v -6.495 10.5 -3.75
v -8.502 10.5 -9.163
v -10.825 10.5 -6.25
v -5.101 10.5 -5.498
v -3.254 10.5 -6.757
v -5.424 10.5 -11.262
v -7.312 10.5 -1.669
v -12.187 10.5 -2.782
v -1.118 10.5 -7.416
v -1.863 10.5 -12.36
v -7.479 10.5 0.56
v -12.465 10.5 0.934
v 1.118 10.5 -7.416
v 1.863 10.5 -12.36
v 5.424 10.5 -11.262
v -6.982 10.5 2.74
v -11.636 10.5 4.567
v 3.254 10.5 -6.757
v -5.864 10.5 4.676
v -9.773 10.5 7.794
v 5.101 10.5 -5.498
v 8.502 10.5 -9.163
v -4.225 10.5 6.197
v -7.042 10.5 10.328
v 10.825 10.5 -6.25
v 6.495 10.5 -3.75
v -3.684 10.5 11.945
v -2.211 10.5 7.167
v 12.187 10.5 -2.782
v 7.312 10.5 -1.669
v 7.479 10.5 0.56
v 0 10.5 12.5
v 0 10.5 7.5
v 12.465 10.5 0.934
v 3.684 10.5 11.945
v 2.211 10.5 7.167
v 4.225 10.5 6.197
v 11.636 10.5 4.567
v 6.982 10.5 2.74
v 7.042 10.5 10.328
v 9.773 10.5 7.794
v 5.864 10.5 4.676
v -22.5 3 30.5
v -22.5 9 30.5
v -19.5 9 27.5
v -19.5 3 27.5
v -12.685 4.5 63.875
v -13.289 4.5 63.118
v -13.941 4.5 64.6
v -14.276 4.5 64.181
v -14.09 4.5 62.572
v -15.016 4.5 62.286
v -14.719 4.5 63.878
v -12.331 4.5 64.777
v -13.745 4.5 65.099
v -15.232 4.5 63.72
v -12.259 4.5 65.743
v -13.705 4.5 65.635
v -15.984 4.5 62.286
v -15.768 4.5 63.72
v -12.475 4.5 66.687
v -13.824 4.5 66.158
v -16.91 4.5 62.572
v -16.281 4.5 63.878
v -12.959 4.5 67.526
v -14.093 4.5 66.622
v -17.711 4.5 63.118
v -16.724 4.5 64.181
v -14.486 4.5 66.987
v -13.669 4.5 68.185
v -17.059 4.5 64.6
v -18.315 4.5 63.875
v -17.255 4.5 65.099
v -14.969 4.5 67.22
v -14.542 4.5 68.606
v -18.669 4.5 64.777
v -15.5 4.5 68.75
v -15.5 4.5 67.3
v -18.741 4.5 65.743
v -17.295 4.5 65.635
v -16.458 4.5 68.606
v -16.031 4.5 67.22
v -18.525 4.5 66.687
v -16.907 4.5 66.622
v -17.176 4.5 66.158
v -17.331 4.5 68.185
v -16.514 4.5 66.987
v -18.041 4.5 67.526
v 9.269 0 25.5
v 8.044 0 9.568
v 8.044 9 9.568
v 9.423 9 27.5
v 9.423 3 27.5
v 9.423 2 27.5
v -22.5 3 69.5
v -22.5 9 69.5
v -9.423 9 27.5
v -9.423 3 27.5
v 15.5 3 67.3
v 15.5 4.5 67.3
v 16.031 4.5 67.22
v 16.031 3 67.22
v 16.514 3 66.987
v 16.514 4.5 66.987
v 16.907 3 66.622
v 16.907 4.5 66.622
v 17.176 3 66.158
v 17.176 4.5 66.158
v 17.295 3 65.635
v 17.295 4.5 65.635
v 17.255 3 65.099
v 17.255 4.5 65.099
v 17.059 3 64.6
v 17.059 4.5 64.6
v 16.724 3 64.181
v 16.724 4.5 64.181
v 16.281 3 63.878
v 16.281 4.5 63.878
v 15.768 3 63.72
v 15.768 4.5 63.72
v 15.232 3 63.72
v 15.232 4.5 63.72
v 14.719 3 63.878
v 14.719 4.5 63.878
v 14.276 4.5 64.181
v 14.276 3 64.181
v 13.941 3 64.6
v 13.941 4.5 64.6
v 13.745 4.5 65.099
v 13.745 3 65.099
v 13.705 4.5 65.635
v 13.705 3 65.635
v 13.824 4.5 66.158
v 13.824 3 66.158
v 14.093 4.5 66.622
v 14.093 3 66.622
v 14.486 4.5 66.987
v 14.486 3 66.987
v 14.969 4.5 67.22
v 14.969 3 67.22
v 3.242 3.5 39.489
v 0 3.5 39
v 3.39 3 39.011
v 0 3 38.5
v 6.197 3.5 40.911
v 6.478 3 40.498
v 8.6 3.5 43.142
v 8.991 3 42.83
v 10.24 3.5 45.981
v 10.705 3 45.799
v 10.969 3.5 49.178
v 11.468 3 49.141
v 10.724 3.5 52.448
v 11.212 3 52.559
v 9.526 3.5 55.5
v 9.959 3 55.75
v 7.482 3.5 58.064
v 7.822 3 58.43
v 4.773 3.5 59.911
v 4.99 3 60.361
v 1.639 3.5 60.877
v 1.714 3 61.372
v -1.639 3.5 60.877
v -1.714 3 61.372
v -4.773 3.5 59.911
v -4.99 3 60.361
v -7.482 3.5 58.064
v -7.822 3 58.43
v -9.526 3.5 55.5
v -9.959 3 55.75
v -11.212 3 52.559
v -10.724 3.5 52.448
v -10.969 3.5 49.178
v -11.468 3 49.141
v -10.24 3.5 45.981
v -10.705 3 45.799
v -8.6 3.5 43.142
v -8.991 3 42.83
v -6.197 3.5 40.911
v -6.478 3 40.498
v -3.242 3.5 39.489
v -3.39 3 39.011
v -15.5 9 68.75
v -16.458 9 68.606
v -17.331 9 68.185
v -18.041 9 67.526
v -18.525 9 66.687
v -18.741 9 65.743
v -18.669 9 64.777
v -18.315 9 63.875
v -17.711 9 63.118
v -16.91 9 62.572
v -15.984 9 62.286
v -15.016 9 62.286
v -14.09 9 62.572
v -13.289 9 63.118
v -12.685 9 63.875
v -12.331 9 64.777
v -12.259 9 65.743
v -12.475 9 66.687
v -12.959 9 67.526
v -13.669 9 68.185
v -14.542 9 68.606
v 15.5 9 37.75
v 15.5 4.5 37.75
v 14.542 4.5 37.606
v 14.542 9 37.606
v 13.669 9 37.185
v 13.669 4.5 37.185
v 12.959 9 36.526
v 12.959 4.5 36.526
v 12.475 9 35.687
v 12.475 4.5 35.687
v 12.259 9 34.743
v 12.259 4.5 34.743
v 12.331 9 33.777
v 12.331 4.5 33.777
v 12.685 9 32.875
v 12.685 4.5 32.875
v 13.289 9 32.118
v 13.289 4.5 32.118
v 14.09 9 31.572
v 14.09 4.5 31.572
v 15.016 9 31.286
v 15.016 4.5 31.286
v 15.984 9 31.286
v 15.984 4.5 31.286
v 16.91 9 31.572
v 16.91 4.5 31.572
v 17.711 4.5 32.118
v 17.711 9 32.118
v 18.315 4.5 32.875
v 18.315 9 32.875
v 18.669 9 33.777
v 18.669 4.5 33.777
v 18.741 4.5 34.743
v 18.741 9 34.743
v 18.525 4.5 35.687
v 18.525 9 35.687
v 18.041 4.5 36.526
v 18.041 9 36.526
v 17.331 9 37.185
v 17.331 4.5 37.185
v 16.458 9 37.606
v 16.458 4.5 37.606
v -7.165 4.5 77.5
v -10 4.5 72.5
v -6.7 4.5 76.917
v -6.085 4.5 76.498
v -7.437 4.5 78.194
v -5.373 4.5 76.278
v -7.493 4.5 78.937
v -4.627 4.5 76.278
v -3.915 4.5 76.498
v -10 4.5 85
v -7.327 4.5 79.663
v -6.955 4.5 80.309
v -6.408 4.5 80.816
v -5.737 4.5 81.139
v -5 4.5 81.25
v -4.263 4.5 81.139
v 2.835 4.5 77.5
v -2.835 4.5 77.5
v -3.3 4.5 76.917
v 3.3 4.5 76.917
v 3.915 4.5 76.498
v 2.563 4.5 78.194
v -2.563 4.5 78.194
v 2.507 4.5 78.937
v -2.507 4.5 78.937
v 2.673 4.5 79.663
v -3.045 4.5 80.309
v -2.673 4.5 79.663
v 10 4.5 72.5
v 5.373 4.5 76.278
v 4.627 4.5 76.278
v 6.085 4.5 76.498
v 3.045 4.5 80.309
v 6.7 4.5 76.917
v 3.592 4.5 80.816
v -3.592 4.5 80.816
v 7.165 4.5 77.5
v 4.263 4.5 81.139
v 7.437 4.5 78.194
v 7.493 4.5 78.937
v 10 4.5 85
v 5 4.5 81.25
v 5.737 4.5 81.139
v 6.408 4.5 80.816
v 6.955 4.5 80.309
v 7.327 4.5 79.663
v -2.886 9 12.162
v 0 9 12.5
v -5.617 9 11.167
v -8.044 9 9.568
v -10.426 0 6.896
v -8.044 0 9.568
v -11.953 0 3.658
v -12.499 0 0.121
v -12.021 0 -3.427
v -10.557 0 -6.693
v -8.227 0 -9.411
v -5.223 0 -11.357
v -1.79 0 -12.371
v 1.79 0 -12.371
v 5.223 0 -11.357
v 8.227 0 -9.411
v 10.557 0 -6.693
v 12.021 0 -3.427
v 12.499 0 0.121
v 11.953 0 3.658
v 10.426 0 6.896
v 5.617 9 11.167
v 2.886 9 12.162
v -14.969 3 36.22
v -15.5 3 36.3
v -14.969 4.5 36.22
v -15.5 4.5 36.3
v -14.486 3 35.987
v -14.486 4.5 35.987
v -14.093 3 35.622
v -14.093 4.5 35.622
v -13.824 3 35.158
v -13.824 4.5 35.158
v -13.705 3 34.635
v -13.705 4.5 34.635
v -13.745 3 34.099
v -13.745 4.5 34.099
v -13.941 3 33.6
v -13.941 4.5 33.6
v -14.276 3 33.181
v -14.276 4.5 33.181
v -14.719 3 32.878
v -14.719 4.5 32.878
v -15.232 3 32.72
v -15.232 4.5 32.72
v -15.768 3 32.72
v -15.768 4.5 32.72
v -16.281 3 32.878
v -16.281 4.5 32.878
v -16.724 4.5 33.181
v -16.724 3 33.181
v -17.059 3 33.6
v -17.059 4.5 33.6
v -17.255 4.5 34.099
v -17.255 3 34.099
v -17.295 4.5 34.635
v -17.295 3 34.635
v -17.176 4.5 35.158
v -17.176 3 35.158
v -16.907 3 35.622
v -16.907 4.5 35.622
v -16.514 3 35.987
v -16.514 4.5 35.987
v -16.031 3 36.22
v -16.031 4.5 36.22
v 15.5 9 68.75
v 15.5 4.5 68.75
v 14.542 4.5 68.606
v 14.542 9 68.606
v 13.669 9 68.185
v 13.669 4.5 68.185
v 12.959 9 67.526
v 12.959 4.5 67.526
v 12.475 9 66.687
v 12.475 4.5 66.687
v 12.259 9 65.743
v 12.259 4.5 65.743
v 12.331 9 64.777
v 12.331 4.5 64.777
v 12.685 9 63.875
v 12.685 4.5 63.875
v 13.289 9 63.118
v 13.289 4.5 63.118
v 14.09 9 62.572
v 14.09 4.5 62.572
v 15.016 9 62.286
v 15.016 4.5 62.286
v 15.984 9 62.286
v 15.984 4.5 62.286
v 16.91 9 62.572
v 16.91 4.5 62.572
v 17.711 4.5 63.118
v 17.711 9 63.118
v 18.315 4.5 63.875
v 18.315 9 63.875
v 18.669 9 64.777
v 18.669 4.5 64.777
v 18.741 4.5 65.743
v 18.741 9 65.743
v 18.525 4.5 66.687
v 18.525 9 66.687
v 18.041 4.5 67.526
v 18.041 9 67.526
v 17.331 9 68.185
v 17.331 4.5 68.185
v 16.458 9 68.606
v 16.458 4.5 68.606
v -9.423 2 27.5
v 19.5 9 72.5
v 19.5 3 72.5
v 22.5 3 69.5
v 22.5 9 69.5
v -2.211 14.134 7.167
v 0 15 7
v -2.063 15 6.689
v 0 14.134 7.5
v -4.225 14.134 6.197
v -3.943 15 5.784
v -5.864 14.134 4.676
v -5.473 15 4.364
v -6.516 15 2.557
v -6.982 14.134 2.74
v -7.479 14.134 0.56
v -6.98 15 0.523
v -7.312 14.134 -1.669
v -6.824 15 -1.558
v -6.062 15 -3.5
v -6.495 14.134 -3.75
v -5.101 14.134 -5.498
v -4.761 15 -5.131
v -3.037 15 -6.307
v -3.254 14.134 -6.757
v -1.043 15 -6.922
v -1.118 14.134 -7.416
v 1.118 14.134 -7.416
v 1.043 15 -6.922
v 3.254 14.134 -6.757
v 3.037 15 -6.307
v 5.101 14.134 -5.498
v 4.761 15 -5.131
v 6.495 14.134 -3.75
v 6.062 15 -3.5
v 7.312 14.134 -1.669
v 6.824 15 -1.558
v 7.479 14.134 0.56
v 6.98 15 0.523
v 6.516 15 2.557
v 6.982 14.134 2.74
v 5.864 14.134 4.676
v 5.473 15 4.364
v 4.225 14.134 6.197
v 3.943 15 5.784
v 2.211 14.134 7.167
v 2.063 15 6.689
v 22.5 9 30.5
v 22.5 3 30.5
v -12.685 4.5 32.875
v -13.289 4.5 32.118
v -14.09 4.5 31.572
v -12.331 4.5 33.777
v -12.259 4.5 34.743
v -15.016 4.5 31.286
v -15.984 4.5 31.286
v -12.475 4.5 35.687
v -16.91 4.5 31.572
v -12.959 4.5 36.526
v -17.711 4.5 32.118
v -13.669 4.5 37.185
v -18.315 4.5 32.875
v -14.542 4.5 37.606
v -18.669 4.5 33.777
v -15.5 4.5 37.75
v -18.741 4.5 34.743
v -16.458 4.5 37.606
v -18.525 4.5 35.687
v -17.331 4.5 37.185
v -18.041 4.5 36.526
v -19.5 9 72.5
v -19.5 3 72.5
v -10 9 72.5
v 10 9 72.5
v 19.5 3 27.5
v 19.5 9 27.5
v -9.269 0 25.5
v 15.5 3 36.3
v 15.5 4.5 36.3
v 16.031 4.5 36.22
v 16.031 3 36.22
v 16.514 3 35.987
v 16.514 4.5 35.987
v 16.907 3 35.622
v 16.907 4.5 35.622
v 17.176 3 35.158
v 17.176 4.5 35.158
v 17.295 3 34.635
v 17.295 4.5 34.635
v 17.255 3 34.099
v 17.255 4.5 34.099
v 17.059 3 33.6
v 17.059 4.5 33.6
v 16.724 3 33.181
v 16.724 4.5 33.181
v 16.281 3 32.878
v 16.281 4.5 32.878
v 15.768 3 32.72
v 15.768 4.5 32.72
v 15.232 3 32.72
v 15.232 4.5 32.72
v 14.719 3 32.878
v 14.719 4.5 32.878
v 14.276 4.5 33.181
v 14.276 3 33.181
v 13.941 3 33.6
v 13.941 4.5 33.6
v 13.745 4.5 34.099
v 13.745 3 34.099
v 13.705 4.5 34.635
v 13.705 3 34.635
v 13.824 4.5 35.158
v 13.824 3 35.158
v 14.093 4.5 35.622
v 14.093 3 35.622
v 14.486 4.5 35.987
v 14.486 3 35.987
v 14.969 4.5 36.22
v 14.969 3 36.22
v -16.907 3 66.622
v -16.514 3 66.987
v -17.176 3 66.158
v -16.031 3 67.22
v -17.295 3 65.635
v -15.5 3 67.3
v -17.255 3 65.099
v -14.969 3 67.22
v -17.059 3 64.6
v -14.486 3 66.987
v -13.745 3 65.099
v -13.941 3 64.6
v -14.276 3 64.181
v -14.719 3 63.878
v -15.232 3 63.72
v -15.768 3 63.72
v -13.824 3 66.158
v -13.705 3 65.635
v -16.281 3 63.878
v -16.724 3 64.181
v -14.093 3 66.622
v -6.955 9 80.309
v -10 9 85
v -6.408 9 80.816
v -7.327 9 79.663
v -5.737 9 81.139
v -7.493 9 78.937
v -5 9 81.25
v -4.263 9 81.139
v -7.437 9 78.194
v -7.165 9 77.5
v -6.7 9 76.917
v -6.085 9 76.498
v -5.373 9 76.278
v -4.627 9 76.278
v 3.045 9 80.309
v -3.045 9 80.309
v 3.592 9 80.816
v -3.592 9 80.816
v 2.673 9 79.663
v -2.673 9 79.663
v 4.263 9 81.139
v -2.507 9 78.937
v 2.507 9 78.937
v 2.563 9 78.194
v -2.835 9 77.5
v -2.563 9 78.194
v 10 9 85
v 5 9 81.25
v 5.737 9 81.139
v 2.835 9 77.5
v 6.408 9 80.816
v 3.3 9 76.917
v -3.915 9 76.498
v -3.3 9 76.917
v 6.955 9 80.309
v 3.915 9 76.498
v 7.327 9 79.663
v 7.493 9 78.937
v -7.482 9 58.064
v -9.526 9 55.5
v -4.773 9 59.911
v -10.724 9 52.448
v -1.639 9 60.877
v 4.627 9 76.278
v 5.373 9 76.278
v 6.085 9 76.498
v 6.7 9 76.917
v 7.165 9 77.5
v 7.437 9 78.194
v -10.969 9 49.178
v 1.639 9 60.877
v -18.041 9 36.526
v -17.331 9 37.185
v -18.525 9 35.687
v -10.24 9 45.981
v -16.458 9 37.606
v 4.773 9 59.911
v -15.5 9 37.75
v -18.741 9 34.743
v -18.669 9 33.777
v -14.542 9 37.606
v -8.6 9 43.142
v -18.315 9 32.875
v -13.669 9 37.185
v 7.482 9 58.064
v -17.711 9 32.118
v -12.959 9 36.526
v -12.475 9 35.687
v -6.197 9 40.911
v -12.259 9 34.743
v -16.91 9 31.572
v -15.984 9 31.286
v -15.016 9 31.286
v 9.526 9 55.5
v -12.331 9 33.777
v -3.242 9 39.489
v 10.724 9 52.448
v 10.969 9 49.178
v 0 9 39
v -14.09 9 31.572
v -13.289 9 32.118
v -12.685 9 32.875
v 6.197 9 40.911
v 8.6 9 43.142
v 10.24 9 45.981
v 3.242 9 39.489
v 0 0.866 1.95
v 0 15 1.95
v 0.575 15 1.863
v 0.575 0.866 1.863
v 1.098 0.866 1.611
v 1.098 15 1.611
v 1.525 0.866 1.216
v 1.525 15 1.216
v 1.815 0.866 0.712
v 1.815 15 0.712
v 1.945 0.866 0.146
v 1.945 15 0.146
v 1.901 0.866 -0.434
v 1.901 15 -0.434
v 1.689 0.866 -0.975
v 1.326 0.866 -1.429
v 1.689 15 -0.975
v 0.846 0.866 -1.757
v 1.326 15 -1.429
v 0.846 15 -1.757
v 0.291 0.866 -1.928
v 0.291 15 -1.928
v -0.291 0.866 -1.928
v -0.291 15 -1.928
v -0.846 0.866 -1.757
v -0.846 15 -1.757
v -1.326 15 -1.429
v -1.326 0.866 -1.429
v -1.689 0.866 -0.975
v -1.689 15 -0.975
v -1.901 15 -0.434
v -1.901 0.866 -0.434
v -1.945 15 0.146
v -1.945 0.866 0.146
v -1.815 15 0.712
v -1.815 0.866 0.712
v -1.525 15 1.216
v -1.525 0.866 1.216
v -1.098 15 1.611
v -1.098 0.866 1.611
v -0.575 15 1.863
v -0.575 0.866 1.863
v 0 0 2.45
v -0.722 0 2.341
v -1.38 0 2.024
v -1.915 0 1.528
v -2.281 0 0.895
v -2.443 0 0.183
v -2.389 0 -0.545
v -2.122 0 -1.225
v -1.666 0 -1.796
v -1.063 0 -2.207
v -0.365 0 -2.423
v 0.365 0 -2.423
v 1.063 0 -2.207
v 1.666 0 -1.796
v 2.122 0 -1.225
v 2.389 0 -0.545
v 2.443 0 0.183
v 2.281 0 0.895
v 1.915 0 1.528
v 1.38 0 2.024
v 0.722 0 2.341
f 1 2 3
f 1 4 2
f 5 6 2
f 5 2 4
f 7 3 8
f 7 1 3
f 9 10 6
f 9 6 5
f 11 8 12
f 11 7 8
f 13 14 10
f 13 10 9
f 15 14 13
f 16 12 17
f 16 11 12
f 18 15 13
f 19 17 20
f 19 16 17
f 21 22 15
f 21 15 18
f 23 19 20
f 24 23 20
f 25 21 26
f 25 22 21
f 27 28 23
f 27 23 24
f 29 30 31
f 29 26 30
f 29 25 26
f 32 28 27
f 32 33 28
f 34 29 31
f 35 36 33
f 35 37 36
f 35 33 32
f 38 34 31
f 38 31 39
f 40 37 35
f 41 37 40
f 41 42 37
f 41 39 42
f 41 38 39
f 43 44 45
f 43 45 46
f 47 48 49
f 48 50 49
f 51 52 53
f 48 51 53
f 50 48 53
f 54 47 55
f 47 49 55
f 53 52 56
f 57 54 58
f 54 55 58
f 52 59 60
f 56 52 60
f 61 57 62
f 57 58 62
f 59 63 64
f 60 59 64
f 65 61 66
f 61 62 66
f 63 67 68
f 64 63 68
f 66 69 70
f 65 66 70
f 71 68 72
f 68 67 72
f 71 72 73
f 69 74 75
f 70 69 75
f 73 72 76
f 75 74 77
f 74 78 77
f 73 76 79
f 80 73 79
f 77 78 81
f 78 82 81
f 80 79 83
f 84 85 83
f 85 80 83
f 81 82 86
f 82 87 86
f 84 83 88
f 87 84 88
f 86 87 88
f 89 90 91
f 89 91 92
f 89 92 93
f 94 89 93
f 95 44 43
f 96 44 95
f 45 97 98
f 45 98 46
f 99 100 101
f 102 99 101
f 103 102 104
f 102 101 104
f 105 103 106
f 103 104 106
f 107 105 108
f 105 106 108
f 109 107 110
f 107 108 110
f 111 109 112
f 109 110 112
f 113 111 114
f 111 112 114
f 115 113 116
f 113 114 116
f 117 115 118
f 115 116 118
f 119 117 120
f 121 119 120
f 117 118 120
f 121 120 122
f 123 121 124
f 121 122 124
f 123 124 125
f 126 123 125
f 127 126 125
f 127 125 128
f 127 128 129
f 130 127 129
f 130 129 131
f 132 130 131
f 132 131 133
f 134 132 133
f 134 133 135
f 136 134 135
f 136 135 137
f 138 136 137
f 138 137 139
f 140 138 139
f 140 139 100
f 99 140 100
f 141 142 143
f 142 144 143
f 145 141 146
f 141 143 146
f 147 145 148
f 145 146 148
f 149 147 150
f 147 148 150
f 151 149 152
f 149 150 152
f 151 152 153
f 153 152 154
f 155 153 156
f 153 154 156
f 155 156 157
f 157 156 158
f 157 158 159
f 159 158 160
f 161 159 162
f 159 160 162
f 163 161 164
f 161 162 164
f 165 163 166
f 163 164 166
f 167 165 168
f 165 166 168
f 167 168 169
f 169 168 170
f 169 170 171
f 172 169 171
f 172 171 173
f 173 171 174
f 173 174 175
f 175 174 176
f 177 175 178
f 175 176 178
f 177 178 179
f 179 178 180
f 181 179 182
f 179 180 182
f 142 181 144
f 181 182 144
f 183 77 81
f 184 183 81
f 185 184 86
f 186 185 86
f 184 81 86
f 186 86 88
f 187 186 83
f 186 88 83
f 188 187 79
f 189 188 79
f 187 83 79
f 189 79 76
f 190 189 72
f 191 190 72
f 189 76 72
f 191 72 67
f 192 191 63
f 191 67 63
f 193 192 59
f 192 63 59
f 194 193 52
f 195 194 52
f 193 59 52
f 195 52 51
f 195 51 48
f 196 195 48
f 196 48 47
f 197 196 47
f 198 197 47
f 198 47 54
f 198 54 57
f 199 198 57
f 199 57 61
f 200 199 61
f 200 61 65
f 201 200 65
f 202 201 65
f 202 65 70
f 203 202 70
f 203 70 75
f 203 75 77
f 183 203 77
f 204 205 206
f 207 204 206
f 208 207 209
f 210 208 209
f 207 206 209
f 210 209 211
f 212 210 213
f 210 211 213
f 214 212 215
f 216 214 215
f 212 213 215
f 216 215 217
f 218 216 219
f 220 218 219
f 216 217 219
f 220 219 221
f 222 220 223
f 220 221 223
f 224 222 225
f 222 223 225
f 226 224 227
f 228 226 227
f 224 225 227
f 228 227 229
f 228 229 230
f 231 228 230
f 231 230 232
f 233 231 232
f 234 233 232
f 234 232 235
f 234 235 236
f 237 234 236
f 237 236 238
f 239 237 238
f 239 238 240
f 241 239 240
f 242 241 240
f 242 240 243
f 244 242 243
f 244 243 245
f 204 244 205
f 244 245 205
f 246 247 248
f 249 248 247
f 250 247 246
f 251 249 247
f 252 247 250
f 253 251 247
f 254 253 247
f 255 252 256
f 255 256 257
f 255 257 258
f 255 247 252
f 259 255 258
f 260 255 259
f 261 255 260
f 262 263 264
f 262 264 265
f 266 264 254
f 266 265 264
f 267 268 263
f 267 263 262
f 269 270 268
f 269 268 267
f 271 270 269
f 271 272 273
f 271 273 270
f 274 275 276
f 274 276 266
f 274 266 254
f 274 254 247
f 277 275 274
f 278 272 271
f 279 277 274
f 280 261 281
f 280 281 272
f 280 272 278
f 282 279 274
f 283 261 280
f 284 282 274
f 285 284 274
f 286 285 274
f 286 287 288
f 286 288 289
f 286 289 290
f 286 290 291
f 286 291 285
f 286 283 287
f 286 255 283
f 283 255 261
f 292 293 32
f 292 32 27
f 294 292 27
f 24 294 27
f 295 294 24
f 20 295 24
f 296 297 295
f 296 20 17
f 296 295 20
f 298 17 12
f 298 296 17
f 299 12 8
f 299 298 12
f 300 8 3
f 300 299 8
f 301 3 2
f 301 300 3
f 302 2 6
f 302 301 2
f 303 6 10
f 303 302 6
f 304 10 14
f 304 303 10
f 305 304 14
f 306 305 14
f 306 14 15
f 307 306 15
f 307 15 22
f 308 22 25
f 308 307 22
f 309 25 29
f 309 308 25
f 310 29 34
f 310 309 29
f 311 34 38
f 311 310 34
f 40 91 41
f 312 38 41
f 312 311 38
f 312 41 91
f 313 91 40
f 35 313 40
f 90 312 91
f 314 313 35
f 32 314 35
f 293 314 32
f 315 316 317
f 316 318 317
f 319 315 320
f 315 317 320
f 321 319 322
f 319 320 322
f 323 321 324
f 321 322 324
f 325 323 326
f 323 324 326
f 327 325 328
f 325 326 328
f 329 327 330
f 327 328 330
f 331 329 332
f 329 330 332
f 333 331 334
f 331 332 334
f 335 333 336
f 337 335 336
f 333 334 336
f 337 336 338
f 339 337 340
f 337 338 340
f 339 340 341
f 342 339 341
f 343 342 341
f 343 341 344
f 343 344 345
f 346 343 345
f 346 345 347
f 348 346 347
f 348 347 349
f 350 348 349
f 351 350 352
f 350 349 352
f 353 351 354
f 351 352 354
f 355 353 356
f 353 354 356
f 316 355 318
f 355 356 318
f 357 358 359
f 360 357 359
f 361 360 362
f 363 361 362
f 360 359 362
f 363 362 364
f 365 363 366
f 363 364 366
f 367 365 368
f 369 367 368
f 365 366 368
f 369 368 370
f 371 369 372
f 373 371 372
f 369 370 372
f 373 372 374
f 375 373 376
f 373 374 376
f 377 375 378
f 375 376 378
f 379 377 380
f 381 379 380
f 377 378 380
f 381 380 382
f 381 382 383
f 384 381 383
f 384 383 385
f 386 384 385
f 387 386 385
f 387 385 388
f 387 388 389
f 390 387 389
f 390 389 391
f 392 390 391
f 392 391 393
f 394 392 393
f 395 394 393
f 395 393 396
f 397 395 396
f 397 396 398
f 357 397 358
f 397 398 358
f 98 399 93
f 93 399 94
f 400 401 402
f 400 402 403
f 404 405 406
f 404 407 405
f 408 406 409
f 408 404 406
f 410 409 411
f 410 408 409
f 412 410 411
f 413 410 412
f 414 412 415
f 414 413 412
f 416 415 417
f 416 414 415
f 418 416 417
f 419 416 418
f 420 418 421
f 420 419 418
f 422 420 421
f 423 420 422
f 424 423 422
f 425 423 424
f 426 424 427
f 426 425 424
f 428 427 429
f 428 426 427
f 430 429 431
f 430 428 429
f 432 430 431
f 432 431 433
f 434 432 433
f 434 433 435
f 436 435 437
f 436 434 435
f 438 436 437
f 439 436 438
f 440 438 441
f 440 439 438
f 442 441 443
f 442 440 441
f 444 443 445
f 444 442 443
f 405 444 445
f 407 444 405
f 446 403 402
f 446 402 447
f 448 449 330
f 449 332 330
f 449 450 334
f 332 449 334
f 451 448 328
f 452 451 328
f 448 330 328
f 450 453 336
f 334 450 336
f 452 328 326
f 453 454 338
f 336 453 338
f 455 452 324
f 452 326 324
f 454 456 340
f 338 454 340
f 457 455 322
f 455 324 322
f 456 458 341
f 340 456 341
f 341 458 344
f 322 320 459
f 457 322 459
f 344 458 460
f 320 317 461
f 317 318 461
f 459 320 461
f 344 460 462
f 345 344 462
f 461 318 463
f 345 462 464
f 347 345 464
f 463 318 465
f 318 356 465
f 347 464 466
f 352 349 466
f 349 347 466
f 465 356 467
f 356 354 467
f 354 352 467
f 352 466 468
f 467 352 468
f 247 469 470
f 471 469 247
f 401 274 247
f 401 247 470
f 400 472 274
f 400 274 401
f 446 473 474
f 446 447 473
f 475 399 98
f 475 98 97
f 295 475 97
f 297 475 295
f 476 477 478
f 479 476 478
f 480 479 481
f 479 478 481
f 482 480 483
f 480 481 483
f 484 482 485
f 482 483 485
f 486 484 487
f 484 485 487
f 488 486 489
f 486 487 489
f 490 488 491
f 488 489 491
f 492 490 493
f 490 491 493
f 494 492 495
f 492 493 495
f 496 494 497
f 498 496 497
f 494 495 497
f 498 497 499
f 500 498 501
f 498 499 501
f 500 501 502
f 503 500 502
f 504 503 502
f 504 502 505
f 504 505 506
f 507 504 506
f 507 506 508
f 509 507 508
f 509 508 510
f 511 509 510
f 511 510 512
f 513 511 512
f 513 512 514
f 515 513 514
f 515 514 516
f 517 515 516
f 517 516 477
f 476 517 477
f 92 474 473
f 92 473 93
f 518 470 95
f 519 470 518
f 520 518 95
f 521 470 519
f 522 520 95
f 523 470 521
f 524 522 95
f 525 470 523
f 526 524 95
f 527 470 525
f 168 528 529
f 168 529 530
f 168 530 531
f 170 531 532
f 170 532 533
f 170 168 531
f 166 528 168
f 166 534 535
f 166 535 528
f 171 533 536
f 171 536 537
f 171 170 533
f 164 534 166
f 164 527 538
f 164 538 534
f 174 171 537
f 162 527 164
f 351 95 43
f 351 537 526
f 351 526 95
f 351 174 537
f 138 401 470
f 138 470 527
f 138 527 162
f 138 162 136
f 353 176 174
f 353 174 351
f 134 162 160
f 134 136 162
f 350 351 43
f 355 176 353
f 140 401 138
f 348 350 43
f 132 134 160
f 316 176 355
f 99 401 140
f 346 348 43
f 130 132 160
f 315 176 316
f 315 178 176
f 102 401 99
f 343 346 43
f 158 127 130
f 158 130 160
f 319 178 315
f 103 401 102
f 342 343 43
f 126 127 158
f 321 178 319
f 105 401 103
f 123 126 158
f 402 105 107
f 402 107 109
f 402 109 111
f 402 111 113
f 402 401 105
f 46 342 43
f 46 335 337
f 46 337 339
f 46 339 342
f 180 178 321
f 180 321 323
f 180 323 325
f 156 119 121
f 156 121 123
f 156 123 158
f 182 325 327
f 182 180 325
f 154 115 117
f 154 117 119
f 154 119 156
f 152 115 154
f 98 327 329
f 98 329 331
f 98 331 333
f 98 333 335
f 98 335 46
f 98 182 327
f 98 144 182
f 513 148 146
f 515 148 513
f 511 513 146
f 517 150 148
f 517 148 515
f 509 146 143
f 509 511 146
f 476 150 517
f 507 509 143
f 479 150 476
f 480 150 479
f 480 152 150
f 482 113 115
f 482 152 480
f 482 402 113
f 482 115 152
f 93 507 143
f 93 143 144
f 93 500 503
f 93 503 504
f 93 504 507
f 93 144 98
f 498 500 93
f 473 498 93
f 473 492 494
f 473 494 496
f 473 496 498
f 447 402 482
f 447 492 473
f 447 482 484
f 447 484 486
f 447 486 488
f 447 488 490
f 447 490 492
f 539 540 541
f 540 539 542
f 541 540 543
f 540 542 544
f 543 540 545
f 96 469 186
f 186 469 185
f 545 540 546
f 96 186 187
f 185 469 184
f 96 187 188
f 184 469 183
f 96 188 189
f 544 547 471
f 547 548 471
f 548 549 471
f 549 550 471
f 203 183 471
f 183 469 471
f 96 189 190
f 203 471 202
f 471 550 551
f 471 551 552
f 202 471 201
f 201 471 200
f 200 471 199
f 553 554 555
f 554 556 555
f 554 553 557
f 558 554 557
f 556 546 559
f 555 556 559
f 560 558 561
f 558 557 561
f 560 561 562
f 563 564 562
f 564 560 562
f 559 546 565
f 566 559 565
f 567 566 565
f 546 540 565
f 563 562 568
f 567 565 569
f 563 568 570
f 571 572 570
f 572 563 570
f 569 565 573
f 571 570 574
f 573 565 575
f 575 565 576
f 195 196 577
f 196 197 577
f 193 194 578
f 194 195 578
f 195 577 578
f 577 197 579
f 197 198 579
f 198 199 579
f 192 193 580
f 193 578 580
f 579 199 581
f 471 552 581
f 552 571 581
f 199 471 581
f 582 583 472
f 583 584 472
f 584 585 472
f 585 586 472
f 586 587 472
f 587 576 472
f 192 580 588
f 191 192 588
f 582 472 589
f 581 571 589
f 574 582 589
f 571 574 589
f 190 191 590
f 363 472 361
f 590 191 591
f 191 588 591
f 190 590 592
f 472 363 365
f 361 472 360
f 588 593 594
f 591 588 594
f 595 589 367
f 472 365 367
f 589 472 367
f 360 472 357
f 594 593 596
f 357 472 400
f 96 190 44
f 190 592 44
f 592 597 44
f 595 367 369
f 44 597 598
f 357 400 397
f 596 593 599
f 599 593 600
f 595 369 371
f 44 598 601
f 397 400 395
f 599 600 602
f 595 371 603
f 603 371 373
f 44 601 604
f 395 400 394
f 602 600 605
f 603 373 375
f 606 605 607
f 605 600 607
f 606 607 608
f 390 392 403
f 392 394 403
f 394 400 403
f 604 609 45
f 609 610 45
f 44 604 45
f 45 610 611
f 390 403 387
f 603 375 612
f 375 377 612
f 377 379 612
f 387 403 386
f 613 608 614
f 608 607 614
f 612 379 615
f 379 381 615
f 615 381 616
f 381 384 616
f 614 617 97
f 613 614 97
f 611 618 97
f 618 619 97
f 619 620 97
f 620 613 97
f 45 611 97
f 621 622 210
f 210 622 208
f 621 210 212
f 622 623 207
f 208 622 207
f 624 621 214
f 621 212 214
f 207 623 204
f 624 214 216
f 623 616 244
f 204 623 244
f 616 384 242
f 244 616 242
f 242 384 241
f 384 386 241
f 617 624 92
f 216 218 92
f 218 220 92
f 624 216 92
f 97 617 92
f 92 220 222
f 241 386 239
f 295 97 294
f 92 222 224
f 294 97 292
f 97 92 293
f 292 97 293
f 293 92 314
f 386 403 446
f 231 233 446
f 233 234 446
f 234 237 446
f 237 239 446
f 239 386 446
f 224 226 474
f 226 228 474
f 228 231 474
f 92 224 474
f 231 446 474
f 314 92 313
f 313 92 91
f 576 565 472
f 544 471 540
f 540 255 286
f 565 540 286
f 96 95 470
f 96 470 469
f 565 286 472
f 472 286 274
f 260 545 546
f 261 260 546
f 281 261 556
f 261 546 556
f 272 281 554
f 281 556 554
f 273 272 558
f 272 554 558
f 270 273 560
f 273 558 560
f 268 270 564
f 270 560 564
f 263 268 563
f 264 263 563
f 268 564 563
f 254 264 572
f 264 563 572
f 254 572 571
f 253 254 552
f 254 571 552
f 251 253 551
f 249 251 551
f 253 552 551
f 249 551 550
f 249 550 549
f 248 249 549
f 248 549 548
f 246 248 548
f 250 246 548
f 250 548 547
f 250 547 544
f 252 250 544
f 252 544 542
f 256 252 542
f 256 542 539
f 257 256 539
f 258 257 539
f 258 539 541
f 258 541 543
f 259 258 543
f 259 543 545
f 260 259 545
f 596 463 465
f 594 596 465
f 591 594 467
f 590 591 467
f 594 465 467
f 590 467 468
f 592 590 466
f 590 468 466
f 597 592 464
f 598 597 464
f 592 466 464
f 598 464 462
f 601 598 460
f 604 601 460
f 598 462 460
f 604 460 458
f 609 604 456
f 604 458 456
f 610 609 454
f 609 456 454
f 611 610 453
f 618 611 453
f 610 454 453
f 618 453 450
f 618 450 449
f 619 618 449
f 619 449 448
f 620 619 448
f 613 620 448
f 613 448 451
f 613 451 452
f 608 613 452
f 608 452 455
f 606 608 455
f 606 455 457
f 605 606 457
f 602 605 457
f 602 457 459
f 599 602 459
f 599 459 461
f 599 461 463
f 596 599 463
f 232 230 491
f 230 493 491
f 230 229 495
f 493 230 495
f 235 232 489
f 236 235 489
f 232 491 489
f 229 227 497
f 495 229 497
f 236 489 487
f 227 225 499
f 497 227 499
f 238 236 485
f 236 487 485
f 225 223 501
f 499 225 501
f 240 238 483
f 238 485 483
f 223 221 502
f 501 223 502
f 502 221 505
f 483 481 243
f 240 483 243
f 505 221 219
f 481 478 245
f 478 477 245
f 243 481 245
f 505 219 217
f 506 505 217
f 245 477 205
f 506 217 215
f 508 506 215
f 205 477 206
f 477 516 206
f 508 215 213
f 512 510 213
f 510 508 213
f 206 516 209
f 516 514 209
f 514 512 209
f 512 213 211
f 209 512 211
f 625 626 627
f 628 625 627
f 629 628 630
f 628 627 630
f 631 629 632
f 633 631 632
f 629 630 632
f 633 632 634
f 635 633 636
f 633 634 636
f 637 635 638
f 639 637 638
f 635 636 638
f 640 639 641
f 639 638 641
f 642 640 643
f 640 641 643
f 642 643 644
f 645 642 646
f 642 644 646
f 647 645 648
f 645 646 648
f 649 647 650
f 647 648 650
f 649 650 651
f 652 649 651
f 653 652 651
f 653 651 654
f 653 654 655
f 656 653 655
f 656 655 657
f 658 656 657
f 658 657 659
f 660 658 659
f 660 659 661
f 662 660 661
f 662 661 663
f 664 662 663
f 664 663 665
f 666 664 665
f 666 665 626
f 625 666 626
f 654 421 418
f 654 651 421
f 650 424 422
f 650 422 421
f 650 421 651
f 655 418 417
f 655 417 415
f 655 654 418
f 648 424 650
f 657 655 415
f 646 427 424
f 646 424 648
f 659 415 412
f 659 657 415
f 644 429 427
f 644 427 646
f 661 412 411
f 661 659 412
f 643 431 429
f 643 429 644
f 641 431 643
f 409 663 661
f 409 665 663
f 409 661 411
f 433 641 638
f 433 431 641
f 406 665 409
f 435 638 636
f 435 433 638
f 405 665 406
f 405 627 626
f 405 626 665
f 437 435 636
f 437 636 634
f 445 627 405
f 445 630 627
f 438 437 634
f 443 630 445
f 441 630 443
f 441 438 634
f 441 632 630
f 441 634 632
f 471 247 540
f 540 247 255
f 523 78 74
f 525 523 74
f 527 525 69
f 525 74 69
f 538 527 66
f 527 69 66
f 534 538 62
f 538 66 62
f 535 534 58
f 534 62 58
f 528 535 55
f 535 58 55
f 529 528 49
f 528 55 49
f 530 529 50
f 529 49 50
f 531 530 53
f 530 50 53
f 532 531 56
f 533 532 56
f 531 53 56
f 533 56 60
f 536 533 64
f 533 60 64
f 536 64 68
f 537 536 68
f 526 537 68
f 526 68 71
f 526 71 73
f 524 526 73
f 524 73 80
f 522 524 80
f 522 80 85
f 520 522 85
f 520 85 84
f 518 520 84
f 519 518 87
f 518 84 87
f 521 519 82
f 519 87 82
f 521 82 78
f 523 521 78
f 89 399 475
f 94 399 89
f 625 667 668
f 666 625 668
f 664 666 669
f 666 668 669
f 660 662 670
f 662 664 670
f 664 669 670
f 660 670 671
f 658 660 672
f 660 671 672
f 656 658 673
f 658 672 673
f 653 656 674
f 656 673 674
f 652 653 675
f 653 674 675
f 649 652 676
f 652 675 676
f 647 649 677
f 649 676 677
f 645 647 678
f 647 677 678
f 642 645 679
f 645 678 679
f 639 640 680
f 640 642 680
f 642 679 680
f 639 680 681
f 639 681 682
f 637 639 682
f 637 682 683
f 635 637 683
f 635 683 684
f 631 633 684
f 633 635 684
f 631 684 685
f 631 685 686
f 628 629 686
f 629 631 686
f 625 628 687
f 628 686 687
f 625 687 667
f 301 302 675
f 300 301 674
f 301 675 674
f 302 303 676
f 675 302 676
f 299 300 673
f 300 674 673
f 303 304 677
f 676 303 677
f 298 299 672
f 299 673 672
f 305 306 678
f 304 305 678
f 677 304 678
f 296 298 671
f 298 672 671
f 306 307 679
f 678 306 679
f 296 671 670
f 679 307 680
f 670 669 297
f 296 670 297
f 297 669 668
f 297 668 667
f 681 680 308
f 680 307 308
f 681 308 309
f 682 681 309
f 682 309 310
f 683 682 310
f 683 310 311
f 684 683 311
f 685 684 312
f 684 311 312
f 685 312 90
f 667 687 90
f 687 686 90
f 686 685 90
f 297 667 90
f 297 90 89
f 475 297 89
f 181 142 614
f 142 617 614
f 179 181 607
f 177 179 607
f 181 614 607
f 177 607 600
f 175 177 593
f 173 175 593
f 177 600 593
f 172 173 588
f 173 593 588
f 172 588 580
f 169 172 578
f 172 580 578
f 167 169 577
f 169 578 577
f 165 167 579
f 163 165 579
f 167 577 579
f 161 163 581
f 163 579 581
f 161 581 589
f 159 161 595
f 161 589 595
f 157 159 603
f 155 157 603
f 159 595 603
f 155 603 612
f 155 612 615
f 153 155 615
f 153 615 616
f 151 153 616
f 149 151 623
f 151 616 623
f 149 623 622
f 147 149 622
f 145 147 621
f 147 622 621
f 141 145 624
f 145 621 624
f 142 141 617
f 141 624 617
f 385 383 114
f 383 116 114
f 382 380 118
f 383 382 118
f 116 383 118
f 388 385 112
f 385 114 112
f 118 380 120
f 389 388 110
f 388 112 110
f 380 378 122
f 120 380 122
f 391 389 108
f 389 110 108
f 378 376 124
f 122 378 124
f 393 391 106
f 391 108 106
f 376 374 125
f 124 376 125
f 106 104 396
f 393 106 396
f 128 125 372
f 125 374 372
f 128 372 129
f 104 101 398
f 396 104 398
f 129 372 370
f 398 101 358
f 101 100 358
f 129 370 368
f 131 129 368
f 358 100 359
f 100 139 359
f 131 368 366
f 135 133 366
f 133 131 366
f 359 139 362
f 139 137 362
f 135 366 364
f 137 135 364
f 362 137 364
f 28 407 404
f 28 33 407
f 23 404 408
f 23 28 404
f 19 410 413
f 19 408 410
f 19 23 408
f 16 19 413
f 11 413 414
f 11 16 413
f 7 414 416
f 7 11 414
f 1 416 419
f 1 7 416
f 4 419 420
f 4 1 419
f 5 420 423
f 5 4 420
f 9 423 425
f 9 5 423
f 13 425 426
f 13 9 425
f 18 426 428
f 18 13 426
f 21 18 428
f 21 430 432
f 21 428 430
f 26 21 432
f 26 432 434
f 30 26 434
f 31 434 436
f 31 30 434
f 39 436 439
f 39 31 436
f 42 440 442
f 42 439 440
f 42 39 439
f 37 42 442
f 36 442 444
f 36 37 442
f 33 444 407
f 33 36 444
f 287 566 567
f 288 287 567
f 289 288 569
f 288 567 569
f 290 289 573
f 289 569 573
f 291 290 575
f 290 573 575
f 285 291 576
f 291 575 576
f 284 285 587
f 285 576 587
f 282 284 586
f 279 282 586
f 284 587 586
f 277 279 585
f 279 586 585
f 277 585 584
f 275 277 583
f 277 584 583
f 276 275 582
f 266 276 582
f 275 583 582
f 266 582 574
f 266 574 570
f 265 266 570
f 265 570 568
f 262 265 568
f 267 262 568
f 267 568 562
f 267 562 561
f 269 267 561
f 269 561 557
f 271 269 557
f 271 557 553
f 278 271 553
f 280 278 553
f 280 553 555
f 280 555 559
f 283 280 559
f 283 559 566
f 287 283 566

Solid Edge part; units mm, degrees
sketch "Sketch1" plane through (0, 0, 0) normal (1, 0, 0) x (0, 1, 0)
  line L0 (0, 1.95) -> (15, 1.95)
  line L1 (15, 1.95) -> (15, 7.5)
  line L2 (15, 7.5) -> (10.5, 7.5)
  line L3 (10.5, 7.5) -> (10.5, 12.5)
  line L4 (10.5, 12.5) -> (0, 12.5)
  line L5 (0, 12.5) -> (0, 1.95)
  dimension "D1" = 10.5
  dimension "D2" = 4.5
revolve "RevolvedProtrusion1" add sketch "Sketch1" angle 360 about axis through (0, -60, 0) along (0, 1, 0)
chamfer "Chamfer_1" distance 0.5 angle 60 1 edges at (0, 15, 7.5) measured on face at (-4.85, 15, 5.15)
sketch "Sketch2" plane through (0, 0, 0) normal (0, -1, 0) x (1, 0, 0)
  line L0 (-7.5, 2.5) -> (7.5, 2.5)
  line L1 (7.5, 2.5) -> (10, 35)
  line L2 (10, 85) -> (10, 35)
  line L3 (-10, 85) -> (10, 85)
  line L4 (-10, 35) -> (-10, 85)
  line L5 (-10, 35) -> (-7.5, 2.5)
  dimension "D1" = 20
  dimension "D2" = 2.5
  dimension "D3" = 15
  dimension "D4" = 85
  dimension "D5" = 35
extrude "ExtrudedProtrusion_1" add sketch "Sketch2" against normal blind 9
chamfer "Chamfer_2" distance 0.5 angle 60 1 edges at (0, 0, 1.95) measured on face at (-8.0833, 0, 2.775)
sketch "Sketch3" plane through (0, 9, 43.7496) normal (0, 1, 0) x (0, 0, -1)
  line L0 (-28.7504, 22.5) -> (-28.7504, -22.5)
  line L1 (-28.7504, -22.5) -> (16.2496, -22.5)
  line L2 (16.2496, -22.5) -> (16.2496, 22.5)
  line L3 (16.2496, 22.5) -> (-28.7504, 22.5)
  dimension "D1" = 50
  dimension "D2" = 45
extrude "ExtrudedProtrusion_2" add sketch "Sketch3" against normal blind 9
sketch "Sketch4" plane through (0, 0, 36.25) normal (0, -1, 0) x (0, 0, 1)
  line L0 (-8.75, -22.5) -> (36.25, -22.5)
  line L1 (36.25, -22.5) -> (36.25, 22.5)
  line L2 (36.25, 22.5) -> (-8.75, 22.5)
  line L3 (-8.75, 22.5) -> (-8.75, -22.5)
extrude "ExtrudedCutout_1" cut sketch "Sketch4" against normal blind 3
hole "Hole_1" at (0, 3, 50) direction (0, 1, 0) diameter 8 end up to next
hole "Hole_2" at (15.5, 9, 65.5) direction (0, -1, 0) diameter 3.6 end up to next counterbore diameter 6.5 counterbore depth 4.5
hole "Hole1" at (-15.5, 9, 65.5) direction (0, -1, 0) diameter 3.6 end up to next counterbore diameter 6.5 counterbore depth 4.5
hole "Hole2" at (-15.5, 9, 34.5) direction (0, -1, 0) diameter 3.6 end up to next counterbore diameter 6.5 counterbore depth 4.5
hole "Hole3" at (15.5, 9, 34.5) direction (0, -1, 0) diameter 3.6 end up to next counterbore diameter 6.5 counterbore depth 4.5
sketch "Sketch5" plane through (0, 4.5, 85) normal (0, 0, 1) x (0, 1, 0)
  line L0 (-4.5, 10) -> (0, 10)
  line L1 (0, 10) -> (0, -10)
  line L2 (0, -10) -> (-4.5, -10)
  line L3 (-4.5, -10) -> (-4.5, 10)
extrude "ExtrudedCutout_2" cut sketch "Sketch5" against normal blind 12.5
hole "Hole_6" at (5, 9, 78.75) direction (0, -1, 0) diameter 5 end up to next
hole "Hole4" at (-5, 9, 78.75) direction (0, -1, 0) diameter 5 end up to next
chamfer "Chamfer_3" distance 3 angle 45 4 edges at (22.5, 6, 27.5) (22.5, 6, 72.5) (-22.5, 6, 72.5) (-22.5, 6, 27.5)
chamfer "Chamfer_4" distance 2 angle 45 1 edges at (0, 0, 27.5)
hole "Hole_8" at (0, 3, 50) direction (0, 1, 0) diameter 22 depth 50.8
chamfer "Chamfer_5" distance 0.5 angle 45 1 edges at (0, 3, 61)
properties material "Polyethylene, low density"
